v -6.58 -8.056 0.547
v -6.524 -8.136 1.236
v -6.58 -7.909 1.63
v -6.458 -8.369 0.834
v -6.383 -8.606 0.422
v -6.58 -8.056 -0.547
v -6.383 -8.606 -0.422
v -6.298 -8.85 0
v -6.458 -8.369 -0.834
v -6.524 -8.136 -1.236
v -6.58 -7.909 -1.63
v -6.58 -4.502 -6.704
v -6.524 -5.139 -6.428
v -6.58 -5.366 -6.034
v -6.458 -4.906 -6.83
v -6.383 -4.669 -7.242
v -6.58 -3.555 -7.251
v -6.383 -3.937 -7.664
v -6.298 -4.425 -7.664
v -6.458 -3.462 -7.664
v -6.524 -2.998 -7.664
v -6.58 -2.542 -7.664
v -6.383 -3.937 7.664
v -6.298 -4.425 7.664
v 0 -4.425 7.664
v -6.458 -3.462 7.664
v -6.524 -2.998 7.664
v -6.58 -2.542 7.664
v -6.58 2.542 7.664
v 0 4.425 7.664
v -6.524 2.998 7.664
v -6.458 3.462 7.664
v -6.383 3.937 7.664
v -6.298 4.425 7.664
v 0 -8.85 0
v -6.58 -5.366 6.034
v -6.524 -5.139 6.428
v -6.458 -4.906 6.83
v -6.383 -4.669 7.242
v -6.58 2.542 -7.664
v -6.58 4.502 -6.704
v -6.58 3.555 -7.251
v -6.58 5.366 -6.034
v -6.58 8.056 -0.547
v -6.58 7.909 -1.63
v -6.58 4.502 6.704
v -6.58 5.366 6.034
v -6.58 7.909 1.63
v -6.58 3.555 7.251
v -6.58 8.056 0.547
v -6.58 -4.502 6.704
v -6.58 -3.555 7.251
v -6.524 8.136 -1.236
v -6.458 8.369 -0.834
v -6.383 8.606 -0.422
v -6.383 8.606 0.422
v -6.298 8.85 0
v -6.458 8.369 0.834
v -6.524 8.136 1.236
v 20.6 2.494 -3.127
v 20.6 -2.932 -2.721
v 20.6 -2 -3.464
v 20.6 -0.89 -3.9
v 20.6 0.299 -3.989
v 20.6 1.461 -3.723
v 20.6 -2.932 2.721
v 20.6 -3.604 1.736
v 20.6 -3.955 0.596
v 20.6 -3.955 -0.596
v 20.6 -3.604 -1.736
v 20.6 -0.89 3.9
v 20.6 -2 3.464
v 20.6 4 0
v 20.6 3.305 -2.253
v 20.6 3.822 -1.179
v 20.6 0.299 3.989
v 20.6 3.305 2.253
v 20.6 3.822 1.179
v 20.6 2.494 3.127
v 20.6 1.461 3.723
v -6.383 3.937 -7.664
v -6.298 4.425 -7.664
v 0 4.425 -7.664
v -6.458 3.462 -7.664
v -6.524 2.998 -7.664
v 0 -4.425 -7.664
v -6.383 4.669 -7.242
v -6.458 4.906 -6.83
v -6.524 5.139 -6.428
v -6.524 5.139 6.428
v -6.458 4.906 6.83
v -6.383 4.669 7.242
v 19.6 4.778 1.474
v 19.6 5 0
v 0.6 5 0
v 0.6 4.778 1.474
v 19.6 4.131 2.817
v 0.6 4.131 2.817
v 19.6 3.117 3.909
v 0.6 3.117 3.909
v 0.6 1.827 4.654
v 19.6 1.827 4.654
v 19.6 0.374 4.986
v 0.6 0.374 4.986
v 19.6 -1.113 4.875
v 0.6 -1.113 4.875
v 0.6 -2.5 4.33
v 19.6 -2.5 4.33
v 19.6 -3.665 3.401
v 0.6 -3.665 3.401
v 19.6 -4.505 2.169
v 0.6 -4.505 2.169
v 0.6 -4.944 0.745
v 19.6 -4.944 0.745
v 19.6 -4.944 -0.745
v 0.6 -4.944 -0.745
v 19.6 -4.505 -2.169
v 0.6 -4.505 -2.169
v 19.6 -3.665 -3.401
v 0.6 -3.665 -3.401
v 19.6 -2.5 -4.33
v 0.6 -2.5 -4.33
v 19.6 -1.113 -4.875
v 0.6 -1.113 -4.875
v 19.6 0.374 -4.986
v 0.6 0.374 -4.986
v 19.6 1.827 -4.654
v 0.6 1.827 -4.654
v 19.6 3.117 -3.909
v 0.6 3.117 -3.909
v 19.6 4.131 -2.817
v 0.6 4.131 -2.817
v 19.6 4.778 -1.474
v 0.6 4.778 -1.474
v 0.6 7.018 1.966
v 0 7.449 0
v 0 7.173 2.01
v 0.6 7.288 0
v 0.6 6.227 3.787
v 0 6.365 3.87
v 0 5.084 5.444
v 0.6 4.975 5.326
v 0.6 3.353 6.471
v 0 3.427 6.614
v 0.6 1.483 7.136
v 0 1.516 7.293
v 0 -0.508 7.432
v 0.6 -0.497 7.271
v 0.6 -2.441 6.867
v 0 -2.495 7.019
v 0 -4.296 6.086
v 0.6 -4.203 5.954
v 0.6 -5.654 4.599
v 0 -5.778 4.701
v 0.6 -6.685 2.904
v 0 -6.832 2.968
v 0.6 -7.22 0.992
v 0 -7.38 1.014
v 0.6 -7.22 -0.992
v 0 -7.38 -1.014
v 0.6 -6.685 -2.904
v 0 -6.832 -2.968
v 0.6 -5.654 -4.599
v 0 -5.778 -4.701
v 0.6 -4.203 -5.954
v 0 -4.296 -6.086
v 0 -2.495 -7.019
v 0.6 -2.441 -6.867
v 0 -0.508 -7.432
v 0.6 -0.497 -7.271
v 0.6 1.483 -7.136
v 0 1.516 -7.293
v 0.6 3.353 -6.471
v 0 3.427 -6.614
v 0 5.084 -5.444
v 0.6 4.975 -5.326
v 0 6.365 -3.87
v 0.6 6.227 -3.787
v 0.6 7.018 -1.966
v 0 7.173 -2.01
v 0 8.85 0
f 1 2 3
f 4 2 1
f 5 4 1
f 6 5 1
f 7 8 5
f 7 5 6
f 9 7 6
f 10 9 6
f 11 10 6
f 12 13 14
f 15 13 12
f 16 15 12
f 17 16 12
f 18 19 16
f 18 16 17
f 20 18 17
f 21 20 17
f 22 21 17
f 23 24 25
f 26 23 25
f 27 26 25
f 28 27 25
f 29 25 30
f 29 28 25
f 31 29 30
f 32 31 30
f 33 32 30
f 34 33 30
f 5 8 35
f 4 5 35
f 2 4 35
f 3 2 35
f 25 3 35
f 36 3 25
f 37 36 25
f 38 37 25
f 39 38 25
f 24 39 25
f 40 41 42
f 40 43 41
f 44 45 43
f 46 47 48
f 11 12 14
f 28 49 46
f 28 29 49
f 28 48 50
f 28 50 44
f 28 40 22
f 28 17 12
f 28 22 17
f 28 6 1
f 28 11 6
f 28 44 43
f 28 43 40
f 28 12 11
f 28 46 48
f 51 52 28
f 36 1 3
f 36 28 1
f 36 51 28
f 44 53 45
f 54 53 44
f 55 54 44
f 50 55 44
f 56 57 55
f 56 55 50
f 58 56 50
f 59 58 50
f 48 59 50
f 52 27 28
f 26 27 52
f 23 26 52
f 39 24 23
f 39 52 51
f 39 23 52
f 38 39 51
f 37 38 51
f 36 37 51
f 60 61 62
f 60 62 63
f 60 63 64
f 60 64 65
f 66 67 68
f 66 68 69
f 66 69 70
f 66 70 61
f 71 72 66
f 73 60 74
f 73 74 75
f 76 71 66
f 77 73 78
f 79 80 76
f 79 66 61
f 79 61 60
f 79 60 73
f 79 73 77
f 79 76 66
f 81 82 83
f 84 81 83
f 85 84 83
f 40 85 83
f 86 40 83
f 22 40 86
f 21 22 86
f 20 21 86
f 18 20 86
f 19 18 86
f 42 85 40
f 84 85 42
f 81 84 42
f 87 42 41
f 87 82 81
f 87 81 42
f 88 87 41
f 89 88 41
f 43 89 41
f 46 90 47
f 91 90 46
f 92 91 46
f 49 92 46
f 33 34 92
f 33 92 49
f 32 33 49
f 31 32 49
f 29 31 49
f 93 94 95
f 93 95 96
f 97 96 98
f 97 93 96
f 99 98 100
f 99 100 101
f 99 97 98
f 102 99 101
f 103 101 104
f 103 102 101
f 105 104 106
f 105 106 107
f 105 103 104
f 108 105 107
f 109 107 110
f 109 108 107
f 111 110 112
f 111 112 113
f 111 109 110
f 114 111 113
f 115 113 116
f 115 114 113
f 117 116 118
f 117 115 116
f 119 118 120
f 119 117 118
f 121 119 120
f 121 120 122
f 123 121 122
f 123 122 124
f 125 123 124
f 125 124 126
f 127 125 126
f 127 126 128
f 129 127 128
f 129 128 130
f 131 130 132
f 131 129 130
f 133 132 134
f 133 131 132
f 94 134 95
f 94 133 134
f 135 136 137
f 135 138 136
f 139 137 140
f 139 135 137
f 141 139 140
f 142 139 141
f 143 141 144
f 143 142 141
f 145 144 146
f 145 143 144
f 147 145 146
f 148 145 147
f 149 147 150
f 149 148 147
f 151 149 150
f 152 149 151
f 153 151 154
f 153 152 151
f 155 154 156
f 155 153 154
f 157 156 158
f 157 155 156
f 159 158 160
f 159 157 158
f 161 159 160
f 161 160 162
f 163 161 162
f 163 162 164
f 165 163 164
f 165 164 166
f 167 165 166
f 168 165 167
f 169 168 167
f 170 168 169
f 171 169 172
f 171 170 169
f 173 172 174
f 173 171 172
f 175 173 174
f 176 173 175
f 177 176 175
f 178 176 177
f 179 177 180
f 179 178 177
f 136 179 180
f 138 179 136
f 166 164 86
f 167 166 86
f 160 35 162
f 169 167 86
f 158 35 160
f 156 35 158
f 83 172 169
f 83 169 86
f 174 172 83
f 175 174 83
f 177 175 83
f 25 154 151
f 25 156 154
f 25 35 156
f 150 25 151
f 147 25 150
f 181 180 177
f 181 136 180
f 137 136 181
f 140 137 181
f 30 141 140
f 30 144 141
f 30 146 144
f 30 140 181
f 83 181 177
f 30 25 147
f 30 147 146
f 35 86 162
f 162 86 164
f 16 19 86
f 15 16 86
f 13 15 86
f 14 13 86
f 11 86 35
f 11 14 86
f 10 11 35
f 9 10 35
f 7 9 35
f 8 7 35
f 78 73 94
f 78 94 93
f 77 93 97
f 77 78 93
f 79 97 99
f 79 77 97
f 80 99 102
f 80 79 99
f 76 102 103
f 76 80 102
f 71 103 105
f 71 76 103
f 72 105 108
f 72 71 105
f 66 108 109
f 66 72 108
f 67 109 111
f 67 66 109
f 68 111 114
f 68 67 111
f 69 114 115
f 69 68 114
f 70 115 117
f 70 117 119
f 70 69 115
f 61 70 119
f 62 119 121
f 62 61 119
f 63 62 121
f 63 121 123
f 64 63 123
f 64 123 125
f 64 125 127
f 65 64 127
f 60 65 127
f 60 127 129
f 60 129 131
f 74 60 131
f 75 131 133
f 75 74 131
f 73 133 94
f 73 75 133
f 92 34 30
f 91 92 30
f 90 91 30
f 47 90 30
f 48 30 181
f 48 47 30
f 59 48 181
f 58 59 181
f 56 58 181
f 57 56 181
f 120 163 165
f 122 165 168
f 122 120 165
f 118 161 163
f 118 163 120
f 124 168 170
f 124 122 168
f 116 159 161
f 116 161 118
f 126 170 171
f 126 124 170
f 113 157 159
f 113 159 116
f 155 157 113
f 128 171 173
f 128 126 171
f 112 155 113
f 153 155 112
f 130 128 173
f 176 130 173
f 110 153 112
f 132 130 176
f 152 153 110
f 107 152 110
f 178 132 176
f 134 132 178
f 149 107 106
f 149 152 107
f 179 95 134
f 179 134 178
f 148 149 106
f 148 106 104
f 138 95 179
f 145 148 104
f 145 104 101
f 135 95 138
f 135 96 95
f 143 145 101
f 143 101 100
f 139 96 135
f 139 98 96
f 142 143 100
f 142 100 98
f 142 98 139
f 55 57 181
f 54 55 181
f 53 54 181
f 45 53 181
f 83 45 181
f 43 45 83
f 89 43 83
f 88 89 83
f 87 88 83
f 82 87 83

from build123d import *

# Parameters (mm, degrees)
SKETCH_2_OUTSIDE_W  = 27.09
SKETCH_2_OUTSIDE_H  = 27.09
CUT_EXTRUDE_1_DEPTH = 28.18
CHAMFER_1_SIZE      = 1


with BuildPart() as part:
    # Эскиз1 → Повернуть1 (revolve)
    with BuildSketch(Plane.XY):
        Polygon((-6.58, 0), (-6.58, 8.85), (0, 8.85), (0, 7.448974596), (0.6, 7.288205081), (0.6, 5), (20.6, 5), (20.6, 0), align=None)
    revolve(axis=Axis((-1000, 0, 0), (1, 0, 0)))

    # Эскиз2 outside → Вырез-Вытянуть1 (cut, through all)
    with BuildSketch(Plane.ZY.offset(6.58)):
        Rectangle(SKETCH_2_OUTSIDE_W, SKETCH_2_OUTSIDE_H)
        Polygon((0, -8.85), (7.664324823, -4.425), (7.664324823, 4.425), (0, 8.85), (-7.664324823, 4.425), (-7.664324823, -4.425), align=None, mode=Mode.SUBTRACT)
    extrude(amount=-CUT_EXTRUDE_1_DEPTH, mode=Mode.SUBTRACT)

    # Эскиз4 → Вырез-Повернуть1 (revolve, cut)
    with BuildSketch(Plane.XY):
        Polygon((-6.58, 8.075), (-6.297923068, 8.85), (-6.58, 8.85), align=None)
    revolve(axis=Axis((-1000, 0, 0), (1, 0, 0)), mode=Mode.SUBTRACT)

    # Фаска1
    chamfer_1_edges = [part.edges().sort_by_distance(p)[0] for p in [
        (20.6, -5, 0),
    ]]
    chamfer(chamfer_1_edges, length=CHAMFER_1_SIZE)


solid = part.part
